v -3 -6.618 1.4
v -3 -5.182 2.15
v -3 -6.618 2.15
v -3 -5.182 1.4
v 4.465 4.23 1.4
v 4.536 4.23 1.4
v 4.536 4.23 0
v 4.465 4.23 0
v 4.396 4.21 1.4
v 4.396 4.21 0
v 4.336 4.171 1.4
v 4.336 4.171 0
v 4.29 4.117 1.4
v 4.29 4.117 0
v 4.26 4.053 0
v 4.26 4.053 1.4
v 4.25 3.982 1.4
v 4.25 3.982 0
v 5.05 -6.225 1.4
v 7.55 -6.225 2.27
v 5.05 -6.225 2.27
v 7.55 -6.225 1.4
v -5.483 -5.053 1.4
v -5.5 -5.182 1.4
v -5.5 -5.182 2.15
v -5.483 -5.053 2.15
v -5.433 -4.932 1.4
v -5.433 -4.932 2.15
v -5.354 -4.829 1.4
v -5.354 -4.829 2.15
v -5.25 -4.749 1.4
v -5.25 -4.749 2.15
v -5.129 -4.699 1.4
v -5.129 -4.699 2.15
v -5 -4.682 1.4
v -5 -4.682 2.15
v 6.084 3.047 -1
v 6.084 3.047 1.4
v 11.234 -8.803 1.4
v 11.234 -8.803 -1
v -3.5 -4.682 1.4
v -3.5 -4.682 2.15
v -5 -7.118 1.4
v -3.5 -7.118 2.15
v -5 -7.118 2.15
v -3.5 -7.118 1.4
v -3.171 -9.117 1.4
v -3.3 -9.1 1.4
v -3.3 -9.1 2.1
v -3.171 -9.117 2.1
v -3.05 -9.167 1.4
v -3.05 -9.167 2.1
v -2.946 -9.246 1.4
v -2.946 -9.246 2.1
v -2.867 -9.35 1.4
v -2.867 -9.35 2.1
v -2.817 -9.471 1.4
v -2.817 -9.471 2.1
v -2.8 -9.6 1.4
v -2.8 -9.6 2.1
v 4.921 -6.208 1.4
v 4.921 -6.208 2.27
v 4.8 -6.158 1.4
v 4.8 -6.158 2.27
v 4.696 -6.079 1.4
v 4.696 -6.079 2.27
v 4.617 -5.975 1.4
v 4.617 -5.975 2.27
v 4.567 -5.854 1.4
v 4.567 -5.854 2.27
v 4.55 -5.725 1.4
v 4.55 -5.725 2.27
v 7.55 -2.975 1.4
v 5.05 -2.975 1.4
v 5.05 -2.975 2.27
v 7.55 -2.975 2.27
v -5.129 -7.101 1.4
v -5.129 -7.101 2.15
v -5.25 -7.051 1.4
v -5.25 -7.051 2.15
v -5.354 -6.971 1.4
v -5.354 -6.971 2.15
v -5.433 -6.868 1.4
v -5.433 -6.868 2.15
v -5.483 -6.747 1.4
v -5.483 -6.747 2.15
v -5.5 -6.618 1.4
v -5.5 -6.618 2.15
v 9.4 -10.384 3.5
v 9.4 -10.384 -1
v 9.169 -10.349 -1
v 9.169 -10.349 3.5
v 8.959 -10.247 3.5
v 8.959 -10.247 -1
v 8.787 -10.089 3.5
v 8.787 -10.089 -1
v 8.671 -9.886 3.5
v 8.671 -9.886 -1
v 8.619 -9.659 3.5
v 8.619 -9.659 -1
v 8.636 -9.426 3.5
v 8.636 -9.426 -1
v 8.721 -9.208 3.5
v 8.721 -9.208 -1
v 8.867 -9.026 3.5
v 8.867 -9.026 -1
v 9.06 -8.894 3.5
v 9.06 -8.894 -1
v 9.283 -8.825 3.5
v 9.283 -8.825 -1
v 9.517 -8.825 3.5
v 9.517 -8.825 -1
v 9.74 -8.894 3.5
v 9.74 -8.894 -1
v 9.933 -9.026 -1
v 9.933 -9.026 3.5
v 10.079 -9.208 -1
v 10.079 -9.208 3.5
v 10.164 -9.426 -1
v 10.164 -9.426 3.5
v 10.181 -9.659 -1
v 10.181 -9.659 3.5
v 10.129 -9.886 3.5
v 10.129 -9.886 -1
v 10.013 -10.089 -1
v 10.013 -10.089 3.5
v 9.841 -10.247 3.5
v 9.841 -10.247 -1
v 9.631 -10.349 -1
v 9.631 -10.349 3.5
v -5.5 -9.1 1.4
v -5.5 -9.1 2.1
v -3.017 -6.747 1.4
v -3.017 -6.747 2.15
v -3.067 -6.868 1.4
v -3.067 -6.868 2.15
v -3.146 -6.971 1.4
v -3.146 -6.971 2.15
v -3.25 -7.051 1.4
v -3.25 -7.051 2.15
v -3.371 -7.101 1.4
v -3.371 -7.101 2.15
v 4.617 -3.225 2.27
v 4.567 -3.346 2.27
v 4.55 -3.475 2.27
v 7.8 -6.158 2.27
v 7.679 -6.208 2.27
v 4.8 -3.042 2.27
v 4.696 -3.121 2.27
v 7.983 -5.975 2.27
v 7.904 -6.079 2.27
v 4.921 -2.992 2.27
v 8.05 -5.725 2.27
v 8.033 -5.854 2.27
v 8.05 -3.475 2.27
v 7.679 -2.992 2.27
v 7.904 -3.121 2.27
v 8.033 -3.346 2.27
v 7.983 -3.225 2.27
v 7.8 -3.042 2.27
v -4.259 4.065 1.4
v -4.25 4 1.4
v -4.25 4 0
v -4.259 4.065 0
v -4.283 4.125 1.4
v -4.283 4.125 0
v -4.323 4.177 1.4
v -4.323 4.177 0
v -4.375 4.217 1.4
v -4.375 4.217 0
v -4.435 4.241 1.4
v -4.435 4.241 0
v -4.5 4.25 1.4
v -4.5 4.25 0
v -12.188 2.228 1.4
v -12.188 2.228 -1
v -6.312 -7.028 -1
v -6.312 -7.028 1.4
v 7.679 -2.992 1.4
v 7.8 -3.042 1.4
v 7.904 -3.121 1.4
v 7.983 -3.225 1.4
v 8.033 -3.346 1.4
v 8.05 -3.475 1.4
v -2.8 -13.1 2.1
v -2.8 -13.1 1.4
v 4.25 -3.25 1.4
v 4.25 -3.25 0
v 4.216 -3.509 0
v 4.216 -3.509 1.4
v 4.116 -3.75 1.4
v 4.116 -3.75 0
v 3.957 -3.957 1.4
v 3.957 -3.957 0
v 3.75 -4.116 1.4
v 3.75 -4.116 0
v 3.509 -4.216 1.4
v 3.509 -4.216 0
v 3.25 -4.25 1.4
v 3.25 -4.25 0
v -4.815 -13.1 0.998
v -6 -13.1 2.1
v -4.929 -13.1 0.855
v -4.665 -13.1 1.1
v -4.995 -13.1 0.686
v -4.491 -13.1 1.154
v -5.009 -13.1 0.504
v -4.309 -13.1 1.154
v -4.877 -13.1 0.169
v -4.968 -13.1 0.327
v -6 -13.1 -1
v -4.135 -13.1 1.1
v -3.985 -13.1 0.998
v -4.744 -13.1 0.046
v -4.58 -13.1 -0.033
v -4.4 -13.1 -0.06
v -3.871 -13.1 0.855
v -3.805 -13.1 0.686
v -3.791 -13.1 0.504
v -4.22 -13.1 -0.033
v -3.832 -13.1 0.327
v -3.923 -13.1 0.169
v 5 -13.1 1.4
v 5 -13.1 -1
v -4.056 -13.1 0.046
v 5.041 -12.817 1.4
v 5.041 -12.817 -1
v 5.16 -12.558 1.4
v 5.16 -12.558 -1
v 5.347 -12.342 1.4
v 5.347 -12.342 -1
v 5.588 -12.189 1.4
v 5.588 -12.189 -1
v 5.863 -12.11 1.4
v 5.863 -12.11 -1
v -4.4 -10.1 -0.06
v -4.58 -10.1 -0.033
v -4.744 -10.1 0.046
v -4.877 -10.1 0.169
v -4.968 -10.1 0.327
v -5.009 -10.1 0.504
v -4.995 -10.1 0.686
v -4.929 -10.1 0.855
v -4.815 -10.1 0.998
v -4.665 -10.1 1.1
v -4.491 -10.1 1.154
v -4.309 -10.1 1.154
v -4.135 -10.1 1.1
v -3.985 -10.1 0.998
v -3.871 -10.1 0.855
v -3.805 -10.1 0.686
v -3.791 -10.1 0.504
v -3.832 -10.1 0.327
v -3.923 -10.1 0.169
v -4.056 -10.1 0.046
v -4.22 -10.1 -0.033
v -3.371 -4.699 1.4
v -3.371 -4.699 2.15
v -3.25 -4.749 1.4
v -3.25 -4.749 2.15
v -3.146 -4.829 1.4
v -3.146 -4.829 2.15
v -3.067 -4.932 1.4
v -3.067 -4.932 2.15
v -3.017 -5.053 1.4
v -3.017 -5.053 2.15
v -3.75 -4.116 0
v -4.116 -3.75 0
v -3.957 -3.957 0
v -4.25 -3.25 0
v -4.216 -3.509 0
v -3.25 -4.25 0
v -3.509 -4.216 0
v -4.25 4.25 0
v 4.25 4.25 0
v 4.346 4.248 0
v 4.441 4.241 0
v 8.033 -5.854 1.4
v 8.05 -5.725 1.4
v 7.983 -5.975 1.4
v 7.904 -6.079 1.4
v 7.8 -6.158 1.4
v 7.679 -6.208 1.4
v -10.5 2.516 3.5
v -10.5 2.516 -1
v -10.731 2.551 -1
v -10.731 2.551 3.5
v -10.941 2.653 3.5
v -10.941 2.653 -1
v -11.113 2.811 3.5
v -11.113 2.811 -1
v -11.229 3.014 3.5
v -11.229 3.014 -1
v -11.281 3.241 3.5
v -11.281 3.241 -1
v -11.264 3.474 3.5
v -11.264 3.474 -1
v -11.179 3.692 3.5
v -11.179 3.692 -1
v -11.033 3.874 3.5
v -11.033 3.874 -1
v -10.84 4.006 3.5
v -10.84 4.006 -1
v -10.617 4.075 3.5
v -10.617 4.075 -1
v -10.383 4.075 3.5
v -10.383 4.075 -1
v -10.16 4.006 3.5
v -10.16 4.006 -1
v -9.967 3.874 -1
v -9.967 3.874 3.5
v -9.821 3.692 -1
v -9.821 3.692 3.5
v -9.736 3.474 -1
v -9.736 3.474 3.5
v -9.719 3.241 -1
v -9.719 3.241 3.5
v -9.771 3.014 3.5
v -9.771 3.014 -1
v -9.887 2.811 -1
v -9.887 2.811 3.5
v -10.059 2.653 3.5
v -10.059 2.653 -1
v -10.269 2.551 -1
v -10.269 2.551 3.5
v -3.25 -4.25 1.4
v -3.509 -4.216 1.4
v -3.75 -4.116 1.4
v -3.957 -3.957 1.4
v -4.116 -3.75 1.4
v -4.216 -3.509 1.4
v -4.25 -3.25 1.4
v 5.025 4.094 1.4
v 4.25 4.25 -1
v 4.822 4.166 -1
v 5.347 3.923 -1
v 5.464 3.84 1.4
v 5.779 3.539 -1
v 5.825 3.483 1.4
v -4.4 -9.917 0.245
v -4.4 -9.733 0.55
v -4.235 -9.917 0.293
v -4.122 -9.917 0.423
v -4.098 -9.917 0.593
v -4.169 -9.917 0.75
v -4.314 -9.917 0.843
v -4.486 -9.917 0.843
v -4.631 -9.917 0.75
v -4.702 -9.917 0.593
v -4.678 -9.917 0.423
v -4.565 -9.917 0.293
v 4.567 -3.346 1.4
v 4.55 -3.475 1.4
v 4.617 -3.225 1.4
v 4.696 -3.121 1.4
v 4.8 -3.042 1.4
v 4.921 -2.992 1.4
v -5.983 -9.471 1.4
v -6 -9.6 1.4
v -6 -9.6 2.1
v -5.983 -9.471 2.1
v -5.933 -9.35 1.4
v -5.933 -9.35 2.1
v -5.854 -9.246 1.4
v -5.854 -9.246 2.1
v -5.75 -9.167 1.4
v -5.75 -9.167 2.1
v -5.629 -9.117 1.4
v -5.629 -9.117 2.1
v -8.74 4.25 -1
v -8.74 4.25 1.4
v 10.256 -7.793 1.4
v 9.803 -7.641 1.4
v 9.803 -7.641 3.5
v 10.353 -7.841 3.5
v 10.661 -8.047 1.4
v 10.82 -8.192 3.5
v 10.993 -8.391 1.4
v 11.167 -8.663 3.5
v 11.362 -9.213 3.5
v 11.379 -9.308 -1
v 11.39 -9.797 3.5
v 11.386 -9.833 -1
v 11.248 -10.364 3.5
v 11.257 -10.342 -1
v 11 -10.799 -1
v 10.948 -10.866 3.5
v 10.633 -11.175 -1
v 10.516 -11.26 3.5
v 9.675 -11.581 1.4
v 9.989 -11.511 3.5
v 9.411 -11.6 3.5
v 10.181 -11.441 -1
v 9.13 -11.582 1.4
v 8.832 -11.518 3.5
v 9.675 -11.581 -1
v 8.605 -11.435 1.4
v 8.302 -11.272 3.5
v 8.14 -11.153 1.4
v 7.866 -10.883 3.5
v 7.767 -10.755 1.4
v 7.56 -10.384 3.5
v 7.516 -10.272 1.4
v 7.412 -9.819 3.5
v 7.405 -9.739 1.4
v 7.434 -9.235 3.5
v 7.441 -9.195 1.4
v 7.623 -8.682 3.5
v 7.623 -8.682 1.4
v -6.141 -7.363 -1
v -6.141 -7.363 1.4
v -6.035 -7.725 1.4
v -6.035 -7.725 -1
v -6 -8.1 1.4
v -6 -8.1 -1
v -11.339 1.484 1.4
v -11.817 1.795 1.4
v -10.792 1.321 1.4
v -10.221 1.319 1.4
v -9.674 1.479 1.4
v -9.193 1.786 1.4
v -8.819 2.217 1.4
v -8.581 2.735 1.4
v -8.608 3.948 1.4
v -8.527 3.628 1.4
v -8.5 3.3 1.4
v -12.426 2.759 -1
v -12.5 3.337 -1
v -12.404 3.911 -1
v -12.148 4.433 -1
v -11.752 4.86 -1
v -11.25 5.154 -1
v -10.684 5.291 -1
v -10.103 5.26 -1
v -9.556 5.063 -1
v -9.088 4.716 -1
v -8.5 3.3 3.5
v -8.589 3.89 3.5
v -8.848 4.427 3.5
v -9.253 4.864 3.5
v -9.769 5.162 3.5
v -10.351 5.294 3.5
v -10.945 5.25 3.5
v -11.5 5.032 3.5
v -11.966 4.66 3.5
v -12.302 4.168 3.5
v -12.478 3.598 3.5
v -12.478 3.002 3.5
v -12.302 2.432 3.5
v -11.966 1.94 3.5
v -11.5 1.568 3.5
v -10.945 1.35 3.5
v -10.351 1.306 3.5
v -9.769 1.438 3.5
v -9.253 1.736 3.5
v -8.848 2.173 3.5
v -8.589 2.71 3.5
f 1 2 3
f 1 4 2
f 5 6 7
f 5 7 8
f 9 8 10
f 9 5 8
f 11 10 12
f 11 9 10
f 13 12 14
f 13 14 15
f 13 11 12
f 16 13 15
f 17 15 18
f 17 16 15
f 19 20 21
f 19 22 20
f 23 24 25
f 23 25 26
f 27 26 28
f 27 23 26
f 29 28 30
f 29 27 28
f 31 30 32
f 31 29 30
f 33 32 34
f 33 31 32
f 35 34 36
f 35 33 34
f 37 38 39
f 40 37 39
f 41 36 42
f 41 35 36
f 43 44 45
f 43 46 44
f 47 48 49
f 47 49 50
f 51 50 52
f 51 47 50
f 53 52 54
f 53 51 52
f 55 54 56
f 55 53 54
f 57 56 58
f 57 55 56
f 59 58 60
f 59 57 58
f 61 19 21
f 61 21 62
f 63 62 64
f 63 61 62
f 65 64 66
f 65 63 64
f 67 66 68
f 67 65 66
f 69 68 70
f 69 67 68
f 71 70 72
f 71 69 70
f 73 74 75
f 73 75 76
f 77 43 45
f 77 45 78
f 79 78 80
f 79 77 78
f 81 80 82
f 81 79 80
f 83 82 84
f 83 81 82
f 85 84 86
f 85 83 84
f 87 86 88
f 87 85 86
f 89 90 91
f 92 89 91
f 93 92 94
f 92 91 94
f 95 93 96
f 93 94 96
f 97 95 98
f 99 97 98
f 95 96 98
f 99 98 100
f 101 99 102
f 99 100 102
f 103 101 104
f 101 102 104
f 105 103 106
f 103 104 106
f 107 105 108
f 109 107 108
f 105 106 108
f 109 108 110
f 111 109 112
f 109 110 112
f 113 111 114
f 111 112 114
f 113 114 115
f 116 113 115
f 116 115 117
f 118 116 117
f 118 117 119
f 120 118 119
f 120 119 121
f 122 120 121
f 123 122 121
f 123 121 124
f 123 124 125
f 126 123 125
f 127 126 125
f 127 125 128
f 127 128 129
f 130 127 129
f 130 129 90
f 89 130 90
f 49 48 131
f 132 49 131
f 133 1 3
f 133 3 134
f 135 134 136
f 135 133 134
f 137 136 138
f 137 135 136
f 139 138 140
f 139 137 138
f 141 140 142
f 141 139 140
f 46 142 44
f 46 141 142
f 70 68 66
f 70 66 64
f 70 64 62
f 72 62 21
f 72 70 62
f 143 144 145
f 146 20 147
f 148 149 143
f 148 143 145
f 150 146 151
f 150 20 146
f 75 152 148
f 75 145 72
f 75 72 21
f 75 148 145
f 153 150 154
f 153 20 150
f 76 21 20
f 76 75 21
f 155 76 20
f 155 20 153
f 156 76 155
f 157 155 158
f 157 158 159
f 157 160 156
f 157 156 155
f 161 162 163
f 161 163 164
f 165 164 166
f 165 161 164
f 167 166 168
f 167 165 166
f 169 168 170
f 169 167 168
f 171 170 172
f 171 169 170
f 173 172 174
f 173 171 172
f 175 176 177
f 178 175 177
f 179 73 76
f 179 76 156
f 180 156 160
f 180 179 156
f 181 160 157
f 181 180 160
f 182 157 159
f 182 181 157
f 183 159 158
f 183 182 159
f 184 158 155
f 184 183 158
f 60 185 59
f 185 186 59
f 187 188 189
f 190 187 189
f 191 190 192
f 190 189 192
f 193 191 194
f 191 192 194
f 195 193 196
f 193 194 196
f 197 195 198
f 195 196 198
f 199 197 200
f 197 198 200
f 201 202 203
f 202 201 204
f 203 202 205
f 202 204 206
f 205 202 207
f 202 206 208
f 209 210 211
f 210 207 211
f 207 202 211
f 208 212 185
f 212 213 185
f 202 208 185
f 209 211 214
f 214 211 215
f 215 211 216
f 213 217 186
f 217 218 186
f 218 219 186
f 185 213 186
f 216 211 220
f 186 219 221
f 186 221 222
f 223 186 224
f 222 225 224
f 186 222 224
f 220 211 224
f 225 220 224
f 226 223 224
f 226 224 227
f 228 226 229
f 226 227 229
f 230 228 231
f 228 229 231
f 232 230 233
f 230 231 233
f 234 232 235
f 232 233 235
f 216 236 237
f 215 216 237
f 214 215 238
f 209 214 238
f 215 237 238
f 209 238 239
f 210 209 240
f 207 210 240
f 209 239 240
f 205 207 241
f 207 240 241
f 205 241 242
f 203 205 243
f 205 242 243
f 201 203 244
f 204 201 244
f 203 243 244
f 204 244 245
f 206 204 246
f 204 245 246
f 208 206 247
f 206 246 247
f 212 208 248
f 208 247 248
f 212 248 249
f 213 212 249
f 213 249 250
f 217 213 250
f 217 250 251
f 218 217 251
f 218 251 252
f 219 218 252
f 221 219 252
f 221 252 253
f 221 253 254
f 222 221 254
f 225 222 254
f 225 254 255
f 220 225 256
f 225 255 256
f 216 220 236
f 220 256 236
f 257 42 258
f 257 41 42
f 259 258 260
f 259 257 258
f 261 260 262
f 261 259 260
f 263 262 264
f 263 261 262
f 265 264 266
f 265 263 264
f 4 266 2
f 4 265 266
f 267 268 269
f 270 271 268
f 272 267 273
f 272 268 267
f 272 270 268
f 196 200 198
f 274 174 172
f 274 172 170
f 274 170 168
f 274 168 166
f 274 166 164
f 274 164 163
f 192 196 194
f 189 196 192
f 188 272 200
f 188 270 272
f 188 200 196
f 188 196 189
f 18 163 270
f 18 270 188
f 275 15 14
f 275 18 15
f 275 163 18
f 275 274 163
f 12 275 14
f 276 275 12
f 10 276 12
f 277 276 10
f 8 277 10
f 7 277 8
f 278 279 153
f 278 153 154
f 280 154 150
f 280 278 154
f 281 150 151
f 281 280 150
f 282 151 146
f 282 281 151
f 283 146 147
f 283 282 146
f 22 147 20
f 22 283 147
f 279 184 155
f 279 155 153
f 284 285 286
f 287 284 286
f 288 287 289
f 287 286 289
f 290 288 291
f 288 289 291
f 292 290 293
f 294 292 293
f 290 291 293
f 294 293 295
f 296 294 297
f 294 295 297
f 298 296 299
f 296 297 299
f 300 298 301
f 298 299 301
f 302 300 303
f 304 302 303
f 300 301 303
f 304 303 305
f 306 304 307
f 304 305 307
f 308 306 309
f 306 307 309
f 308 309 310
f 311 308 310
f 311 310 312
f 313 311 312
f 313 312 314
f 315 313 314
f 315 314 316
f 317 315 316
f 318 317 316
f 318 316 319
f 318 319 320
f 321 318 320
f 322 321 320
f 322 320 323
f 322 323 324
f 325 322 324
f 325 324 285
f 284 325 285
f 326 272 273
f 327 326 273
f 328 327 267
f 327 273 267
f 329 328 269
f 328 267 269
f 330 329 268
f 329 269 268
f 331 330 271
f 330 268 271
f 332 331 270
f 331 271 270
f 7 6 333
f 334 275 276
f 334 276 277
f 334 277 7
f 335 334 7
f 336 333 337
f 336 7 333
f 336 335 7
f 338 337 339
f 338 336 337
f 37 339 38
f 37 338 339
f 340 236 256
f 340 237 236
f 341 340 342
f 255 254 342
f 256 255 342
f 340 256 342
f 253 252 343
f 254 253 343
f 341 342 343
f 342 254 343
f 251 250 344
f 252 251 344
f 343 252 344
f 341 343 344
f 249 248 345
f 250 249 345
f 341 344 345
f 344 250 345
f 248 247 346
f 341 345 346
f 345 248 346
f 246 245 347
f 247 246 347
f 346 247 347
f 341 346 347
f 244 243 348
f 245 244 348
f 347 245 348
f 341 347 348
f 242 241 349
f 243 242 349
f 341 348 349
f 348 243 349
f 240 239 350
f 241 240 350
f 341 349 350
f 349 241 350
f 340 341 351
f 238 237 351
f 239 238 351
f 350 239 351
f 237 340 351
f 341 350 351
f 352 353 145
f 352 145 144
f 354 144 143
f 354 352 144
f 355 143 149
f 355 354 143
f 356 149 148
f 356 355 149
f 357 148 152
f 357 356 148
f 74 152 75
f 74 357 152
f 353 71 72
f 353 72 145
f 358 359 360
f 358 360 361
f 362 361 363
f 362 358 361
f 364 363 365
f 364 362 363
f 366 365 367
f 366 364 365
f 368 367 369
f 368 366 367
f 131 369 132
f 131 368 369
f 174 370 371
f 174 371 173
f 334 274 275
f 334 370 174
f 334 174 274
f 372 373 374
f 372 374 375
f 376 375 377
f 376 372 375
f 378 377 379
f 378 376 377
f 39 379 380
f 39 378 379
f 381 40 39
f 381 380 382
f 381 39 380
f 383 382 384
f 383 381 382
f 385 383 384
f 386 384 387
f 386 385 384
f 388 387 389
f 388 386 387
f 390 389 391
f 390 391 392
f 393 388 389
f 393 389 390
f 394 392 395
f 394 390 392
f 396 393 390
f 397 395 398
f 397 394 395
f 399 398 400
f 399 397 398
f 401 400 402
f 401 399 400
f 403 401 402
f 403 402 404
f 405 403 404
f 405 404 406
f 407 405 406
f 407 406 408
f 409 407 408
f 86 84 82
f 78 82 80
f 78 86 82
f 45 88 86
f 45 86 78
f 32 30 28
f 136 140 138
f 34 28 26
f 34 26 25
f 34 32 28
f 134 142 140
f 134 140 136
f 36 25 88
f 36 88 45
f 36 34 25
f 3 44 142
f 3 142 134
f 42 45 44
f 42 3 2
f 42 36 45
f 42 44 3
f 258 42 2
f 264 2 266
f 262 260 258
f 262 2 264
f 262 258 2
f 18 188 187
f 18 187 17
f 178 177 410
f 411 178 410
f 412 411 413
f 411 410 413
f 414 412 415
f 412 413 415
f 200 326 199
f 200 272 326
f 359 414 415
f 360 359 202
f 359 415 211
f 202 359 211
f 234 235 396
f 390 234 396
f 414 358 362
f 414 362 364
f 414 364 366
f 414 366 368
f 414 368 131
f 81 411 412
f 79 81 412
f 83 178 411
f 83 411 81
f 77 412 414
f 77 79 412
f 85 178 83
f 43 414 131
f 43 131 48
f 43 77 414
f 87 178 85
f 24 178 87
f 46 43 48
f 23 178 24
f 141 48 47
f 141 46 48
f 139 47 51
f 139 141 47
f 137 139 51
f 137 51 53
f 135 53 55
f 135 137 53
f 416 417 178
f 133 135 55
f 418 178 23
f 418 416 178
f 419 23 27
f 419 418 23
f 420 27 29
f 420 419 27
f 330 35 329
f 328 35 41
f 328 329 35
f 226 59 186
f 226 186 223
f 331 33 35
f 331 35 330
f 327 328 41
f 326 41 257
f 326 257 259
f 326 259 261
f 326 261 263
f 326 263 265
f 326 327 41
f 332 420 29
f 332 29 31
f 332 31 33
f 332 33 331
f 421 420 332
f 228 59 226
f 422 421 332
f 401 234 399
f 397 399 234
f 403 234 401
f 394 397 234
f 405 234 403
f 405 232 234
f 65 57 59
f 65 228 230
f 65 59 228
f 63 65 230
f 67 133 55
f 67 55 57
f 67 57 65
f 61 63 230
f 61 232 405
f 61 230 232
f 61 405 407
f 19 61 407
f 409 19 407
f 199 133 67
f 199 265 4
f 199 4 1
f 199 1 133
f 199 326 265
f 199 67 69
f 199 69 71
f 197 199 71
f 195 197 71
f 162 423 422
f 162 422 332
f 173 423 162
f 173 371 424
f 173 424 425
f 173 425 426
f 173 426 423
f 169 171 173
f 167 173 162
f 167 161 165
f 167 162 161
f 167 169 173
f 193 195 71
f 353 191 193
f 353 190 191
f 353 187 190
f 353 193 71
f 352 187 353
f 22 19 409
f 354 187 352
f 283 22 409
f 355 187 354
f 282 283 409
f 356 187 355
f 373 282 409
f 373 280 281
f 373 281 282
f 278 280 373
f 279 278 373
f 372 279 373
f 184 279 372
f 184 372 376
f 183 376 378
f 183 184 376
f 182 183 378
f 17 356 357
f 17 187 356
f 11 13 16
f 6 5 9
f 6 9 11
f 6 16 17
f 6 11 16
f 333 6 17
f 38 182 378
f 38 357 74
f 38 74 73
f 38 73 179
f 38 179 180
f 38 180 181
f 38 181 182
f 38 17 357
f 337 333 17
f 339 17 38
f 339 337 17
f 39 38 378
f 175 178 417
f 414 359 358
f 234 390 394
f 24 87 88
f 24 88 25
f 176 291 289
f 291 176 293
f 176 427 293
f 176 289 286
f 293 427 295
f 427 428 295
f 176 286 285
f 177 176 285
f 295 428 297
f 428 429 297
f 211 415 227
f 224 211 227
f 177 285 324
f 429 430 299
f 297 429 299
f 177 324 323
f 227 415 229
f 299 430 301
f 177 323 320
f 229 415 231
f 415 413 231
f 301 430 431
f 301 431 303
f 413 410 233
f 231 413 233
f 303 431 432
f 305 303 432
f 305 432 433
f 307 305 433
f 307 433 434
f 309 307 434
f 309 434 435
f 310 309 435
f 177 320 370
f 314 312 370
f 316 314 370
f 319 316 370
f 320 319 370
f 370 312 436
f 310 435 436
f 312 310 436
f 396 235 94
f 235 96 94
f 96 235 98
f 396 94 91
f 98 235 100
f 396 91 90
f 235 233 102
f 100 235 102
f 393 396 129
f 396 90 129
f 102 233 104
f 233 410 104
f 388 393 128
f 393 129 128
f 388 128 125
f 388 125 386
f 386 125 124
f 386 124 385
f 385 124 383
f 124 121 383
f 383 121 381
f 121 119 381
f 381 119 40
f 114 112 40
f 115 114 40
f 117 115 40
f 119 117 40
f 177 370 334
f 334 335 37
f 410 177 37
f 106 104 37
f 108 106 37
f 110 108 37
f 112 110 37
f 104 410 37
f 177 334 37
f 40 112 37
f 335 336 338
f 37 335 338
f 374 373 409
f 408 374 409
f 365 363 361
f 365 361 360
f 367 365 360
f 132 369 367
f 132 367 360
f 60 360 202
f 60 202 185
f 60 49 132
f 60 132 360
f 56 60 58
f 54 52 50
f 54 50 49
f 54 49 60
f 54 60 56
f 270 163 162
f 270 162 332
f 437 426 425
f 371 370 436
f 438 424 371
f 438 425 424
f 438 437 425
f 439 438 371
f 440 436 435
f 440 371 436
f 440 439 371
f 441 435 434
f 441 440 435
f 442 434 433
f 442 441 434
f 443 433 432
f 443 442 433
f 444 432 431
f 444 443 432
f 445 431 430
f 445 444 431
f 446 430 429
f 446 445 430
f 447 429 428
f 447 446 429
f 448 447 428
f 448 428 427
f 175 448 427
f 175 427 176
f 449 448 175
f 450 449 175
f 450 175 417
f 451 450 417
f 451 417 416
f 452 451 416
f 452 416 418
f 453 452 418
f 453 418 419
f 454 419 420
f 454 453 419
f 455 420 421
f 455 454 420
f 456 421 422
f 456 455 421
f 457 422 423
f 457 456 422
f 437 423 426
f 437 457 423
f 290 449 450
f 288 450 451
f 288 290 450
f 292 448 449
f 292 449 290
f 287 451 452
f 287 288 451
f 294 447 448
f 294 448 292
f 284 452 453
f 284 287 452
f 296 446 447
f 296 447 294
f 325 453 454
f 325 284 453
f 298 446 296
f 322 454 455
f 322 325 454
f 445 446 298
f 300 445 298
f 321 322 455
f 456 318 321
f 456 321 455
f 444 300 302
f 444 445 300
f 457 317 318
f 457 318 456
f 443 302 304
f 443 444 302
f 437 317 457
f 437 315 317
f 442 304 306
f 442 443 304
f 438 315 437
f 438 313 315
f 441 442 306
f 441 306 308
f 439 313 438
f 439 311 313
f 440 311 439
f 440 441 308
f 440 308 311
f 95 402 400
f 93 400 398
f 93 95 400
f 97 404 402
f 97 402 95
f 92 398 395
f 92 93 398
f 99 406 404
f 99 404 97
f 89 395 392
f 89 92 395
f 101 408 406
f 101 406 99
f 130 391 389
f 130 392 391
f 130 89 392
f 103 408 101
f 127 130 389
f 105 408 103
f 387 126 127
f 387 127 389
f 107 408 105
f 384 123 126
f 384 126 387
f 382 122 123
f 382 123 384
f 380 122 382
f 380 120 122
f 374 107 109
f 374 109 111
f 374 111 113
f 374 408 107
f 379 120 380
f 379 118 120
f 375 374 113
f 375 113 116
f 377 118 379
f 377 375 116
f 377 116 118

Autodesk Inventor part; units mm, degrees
ref_plane "YZ Plane" through (0, 0, 0) normal (1, 0, 0) x (0, 1, 0)
ref_plane "XZ Plane" through (0, 0, 0) normal (0, 1, 0) x (-1, 0, 0)
ref_plane "XY Plane" through (0, 0, 0) normal (0, 0, 1) x (1, 0, 0)
sketch "Sketch7" plane through (0, 0, 0) normal (0, 0, 1) x (1, 0, 0)
  line L0 (-3.75, -3.75) -> (3.75, -3.75) construction
  line L1 (3.75, -3.75) -> (3.75, 3.75) construction
  line L2 (3.75, 3.75) -> (-3.75, 3.75) construction
  line L3 (-3.75, 3.75) -> (-3.75, -3.75) construction
  line L4 (-3.75, -3.75) -> (3.75, 3.75) construction
  line L5 (3.75, -3.75) -> (-3.75, 3.75) construction
  line L6 (7.875, -6.175) -> (4.725, -6.175) construction
  line L7 (4.725, -6.175) -> (4.725, -3.025) construction
  line L8 (4.725, -3.025) -> (7.875, -3.025) construction
  line L9 (7.875, -3.025) -> (7.875, -6.175) construction
  line L10 (7.875, -6.175) -> (4.725, -3.025) construction
  line L11 (4.725, -6.175) -> (7.875, -3.025) construction
  line L12 (-3.275, -4.95) -> (-5.225, -4.95) construction
  line L13 (-5.225, -4.95) -> (-5.225, -6.85) construction
  line L14 (-5.225, -6.85) -> (-3.275, -6.85) construction
  line L15 (-3.275, -6.85) -> (-3.275, -4.95) construction
  line L16 (-3.275, -4.95) -> (-5.225, -6.85) construction
  line L17 (-5.225, -4.95) -> (-3.275, -6.85) construction
  circle A0 centre (9.4, -9.6) radius 2
  circle A1 centre (-10.5, 3.3) radius 2
  line L18 (5.05, -2.975) -> (7.55, -2.975)
  line L19 (8.05, -3.475) -> (8.05, -5.725)
  line L20 (7.55, -6.225) -> (5.05, -6.225)
  line L21 (4.55, -5.725) -> (4.55, -3.475)
  arc A2 (5.05, -2.975) -> (4.55, -3.475) centre (5.05, -3.475) ccw
  arc A3 (4.55, -5.725) -> (5.05, -6.225) centre (5.05, -5.725) ccw
  arc A4 (7.55, -6.225) -> (8.05, -5.725) centre (7.55, -5.725) ccw
  arc A5 (8.05, -3.475) -> (7.55, -2.975) centre (7.55, -3.475) ccw
  line L22 (7.55, -5.725) -> (9.4, -9.6) construction
  circle A6 centre (8.2393, -7.1689) radius 1.1 construction
  line L23 (9.8034, -7.6411) -> (7.6231, -8.682)
  line L24 (-8.74, 4.25) -> (4.25, 4.25)
  arc A7 (6.0843, 3.0472) -> (4.25, 4.25) centre (4.25, 2.25) ccw
  line L25 (6.0843, 3.0472) -> (11.2343, -8.8028)
  line L26 (-12.1884, 2.228) -> (-6.3116, -7.028)
  arc A8 (-6, -8.1) -> (-6.3116, -7.028) centre (-8, -8.1) ccw
  line L27 (-6, -8.1) -> (-6, -13.1)
  line L28 (-6, -13.1) -> (5, -13.1)
  arc A9 (5.8627, -12.1095) -> (5, -13.1) centre (6, -13.1) ccw
  line L29 (5.8627, -12.1095) -> (9.6746, -11.5811)
  line L30 (-4.25, 4.25) -> (-4.25, -3.25)
  arc A10 (-4.25, -3.25) -> (-3.25, -4.25) centre (-3.25, -3.25) ccw
  line L31 (-3.25, -4.25) -> (3.25, -4.25)
  arc A11 (3.25, -4.25) -> (4.25, -3.25) centre (3.25, -3.25) ccw
  line L32 (4.25, -3.25) -> (4.25, 4.25)
  line L33 (-3.5, -7.1179) -> (-5, -7.1179)
  line L34 (-5.5, -6.6179) -> (-5.5, -5.1821)
  line L35 (-5, -4.6821) -> (-3.5, -4.6821)
  line L36 (-3, -5.1821) -> (-3, -6.6179)
  arc A12 (-3.5, -7.1179) -> (-3, -6.6179) centre (-3.5, -6.6179) ccw
  arc A13 (-5.5, -6.6179) -> (-5, -7.1179) centre (-5, -6.6179) ccw
  arc A14 (-5, -4.6821) -> (-5.5, -5.1821) centre (-5, -5.1821) ccw
  arc A15 (-3, -5.1821) -> (-3.5, -4.6821) centre (-3.5, -5.1821) ccw
  line L37 (-2.8, -13.1) -> (-2.8, -9.6)
  arc A16 (-2.8, -9.6) -> (-3.3, -9.1) centre (-3.3, -9.6) ccw
  line L38 (-3.3, -9.1) -> (-5.5, -9.1)
  arc A17 (-5.5, -9.1) -> (-6, -9.6) centre (-5.5, -9.6) ccw
  point P0 (0, 0)
  point P1 (6.3, -4.6)
  point P2 (-4.25, -5.9)
  point P3 (6.3, -2.975)
  point P4 (6.3, -3.025)
  point P5 (4.725, -4.6)
  point P6 (4.55, -4.6)
  point P7 (0, -4.25)
  point P8 (0, 0)
  point P9 (-5.5, -4.6821)
  point P10 (-4.25, -7.1179)
  point P11 (-4.25, -5.9)
  point P12 (-4.25, -5.9)
  point P13 (-3, -5.9)
  dimension "d58" = 7.5
  dimension "d60" = 4.6
  dimension "d61" = 6.3
  dimension "d62" = 3.15
  dimension "d63" = 4.25
  dimension "d64" = 1.95
  dimension "d65" = 1.9
  dimension "d66" = 5.9
  dimension "d67" = 4
  dimension "d68" = 19.9
  dimension "d69" = 12.9
  dimension "d70" = 9.4
  dimension "d71" = 9.6
  dimension "d83" = 0.5
  dimension "d84" = 2.2
  dimension "d85" = 1.594
  dimension "d86" = 3.5
  dimension "d87" = 3.25
  dimension "d88" = 4.25
  dimension "d89" = 2
  dimension "d91" = 13.1
  dimension "d93" = 5
  dimension "d94" = 5
  dimension "d97" = 6
  dimension "d98" = 8.5
  dimension "d99" = 1
  dimension "d100" = 4.25
  dimension "d105" = 0.5
  dimension "d106" = 2.5
  dimension "d109" = 3.2
  dimension "d110" = 4
extrude "Extrusion5" add sketch "Sketch7" along normal blind 3.5 and the other way blind 1 contours A0 L23 | A1 picked at (10.0114, -9.3401)
sketch "Sketch8" plane through (-10.5, 3.3, 3.5) normal (0, 0, 1) x (1, 0, 0)
  circle A0 centre (0, 0) radius 2 projected
  arc A1 (18.1231, -11.982) -> (20.3034, -10.9411) centre (19.9, -12.9) ccw projected
  line L0 (20.3034, -10.9411) -> (18.1231, -11.982) projected
  point P0 (10.5, -3.3)
hole "Hole3" at (-10.5, 3.3, 3.5) at (9.4, -9.6, 3.5) direction (0, 0, -1) diameter 1.567 end through all thread size "M2x0.4" class "6H" standard "ANSI Metric M Profile"
extrude "Extrusion6" add sketch "Sketch7" against normal up to surface (1 mm away) contours A0 L29 A9 L28 L37 A16 L38 A17 L27 A8 L26 A1 L24 L30 A10 L31 A11 L32 A7 L25 | L23 A0 | L32 A11 L31 A10 L30 L24 | L28 L27 A17 L38 A16 L37 | L18 A5 L19 A4 L20 A3 L21 A2 | L33 A13 L34 A14 L35 A15 L36 A12 picked at (8.4293, -8.2151)
extrude "Extrusion7" add sketch "Sketch7" along normal blind 1.4 contours A0 L29 A9 L28 L37 A16 L38 A17 L27 A8 L26 A1 L24 L30 A10 L31 A11 L32 A7 L25 | L23 A0 | L28 L27 A17 L38 A16 L37 | L18 A5 L19 A4 L20 A3 L21 A2 | L33 A13 L34 A14 L35 A15 L36 A12 picked at (8.4293, -8.2151)
extrude "Extrusion8" add sketch "Sketch7" along normal blind 2.27 contours L18 A5 L19 A4 L20 A3 L21 A2
extrude "Extrusion9" add sketch "Sketch7" along normal blind 2.15 contours L33 A13 L34 A14 L35 A15 L36 A12
extrude "Extrusion10" add sketch "Sketch7" along normal blind 2.1 contours L28 L27 A17 L38 A16 L37
sketch "Sketch9" plane through (-6, -13.1, -1) normal (0, -1, 0) x (1, 0, 0)
  line L0 (0, 0) -> (0, 3.1) projected
  line L1 (11, 0) -> (0, 0) projected
  line L2 (11, 0) -> (11, 2.4) projected
  line L3 (3.2, 2.4) -> (11, 2.4) projected
  line L4 (3.2, 2.4) -> (3.2, 3.1) projected
  line L5 (0, 3.1) -> (3.2, 3.1) projected
  line L6 (0, 0) -> (3.2, 3.1) construction
  point P0 (6, 1)
  point P1 (1.6, 1.55)
hole "Hole4" at (-4.4, -13.1, 0.55) direction (0, 1, 0) diameter 1.221 depth 3 tip angle 118 thread size "M1.6x0.35" class "6H" standard "ANSI Metric M Profile"
fillet "Fillet3" radius 0.25 2 edges at (4.25, 4.25, 0.7) (-4.25, 4.25, 0.7)
equation "\"d100\" = 0.5 * d98"
equation "\"SilPad\" = 0.35"
properties part number "EPS_RegulatorHeatsink-B" material "Aluminum 6061"
